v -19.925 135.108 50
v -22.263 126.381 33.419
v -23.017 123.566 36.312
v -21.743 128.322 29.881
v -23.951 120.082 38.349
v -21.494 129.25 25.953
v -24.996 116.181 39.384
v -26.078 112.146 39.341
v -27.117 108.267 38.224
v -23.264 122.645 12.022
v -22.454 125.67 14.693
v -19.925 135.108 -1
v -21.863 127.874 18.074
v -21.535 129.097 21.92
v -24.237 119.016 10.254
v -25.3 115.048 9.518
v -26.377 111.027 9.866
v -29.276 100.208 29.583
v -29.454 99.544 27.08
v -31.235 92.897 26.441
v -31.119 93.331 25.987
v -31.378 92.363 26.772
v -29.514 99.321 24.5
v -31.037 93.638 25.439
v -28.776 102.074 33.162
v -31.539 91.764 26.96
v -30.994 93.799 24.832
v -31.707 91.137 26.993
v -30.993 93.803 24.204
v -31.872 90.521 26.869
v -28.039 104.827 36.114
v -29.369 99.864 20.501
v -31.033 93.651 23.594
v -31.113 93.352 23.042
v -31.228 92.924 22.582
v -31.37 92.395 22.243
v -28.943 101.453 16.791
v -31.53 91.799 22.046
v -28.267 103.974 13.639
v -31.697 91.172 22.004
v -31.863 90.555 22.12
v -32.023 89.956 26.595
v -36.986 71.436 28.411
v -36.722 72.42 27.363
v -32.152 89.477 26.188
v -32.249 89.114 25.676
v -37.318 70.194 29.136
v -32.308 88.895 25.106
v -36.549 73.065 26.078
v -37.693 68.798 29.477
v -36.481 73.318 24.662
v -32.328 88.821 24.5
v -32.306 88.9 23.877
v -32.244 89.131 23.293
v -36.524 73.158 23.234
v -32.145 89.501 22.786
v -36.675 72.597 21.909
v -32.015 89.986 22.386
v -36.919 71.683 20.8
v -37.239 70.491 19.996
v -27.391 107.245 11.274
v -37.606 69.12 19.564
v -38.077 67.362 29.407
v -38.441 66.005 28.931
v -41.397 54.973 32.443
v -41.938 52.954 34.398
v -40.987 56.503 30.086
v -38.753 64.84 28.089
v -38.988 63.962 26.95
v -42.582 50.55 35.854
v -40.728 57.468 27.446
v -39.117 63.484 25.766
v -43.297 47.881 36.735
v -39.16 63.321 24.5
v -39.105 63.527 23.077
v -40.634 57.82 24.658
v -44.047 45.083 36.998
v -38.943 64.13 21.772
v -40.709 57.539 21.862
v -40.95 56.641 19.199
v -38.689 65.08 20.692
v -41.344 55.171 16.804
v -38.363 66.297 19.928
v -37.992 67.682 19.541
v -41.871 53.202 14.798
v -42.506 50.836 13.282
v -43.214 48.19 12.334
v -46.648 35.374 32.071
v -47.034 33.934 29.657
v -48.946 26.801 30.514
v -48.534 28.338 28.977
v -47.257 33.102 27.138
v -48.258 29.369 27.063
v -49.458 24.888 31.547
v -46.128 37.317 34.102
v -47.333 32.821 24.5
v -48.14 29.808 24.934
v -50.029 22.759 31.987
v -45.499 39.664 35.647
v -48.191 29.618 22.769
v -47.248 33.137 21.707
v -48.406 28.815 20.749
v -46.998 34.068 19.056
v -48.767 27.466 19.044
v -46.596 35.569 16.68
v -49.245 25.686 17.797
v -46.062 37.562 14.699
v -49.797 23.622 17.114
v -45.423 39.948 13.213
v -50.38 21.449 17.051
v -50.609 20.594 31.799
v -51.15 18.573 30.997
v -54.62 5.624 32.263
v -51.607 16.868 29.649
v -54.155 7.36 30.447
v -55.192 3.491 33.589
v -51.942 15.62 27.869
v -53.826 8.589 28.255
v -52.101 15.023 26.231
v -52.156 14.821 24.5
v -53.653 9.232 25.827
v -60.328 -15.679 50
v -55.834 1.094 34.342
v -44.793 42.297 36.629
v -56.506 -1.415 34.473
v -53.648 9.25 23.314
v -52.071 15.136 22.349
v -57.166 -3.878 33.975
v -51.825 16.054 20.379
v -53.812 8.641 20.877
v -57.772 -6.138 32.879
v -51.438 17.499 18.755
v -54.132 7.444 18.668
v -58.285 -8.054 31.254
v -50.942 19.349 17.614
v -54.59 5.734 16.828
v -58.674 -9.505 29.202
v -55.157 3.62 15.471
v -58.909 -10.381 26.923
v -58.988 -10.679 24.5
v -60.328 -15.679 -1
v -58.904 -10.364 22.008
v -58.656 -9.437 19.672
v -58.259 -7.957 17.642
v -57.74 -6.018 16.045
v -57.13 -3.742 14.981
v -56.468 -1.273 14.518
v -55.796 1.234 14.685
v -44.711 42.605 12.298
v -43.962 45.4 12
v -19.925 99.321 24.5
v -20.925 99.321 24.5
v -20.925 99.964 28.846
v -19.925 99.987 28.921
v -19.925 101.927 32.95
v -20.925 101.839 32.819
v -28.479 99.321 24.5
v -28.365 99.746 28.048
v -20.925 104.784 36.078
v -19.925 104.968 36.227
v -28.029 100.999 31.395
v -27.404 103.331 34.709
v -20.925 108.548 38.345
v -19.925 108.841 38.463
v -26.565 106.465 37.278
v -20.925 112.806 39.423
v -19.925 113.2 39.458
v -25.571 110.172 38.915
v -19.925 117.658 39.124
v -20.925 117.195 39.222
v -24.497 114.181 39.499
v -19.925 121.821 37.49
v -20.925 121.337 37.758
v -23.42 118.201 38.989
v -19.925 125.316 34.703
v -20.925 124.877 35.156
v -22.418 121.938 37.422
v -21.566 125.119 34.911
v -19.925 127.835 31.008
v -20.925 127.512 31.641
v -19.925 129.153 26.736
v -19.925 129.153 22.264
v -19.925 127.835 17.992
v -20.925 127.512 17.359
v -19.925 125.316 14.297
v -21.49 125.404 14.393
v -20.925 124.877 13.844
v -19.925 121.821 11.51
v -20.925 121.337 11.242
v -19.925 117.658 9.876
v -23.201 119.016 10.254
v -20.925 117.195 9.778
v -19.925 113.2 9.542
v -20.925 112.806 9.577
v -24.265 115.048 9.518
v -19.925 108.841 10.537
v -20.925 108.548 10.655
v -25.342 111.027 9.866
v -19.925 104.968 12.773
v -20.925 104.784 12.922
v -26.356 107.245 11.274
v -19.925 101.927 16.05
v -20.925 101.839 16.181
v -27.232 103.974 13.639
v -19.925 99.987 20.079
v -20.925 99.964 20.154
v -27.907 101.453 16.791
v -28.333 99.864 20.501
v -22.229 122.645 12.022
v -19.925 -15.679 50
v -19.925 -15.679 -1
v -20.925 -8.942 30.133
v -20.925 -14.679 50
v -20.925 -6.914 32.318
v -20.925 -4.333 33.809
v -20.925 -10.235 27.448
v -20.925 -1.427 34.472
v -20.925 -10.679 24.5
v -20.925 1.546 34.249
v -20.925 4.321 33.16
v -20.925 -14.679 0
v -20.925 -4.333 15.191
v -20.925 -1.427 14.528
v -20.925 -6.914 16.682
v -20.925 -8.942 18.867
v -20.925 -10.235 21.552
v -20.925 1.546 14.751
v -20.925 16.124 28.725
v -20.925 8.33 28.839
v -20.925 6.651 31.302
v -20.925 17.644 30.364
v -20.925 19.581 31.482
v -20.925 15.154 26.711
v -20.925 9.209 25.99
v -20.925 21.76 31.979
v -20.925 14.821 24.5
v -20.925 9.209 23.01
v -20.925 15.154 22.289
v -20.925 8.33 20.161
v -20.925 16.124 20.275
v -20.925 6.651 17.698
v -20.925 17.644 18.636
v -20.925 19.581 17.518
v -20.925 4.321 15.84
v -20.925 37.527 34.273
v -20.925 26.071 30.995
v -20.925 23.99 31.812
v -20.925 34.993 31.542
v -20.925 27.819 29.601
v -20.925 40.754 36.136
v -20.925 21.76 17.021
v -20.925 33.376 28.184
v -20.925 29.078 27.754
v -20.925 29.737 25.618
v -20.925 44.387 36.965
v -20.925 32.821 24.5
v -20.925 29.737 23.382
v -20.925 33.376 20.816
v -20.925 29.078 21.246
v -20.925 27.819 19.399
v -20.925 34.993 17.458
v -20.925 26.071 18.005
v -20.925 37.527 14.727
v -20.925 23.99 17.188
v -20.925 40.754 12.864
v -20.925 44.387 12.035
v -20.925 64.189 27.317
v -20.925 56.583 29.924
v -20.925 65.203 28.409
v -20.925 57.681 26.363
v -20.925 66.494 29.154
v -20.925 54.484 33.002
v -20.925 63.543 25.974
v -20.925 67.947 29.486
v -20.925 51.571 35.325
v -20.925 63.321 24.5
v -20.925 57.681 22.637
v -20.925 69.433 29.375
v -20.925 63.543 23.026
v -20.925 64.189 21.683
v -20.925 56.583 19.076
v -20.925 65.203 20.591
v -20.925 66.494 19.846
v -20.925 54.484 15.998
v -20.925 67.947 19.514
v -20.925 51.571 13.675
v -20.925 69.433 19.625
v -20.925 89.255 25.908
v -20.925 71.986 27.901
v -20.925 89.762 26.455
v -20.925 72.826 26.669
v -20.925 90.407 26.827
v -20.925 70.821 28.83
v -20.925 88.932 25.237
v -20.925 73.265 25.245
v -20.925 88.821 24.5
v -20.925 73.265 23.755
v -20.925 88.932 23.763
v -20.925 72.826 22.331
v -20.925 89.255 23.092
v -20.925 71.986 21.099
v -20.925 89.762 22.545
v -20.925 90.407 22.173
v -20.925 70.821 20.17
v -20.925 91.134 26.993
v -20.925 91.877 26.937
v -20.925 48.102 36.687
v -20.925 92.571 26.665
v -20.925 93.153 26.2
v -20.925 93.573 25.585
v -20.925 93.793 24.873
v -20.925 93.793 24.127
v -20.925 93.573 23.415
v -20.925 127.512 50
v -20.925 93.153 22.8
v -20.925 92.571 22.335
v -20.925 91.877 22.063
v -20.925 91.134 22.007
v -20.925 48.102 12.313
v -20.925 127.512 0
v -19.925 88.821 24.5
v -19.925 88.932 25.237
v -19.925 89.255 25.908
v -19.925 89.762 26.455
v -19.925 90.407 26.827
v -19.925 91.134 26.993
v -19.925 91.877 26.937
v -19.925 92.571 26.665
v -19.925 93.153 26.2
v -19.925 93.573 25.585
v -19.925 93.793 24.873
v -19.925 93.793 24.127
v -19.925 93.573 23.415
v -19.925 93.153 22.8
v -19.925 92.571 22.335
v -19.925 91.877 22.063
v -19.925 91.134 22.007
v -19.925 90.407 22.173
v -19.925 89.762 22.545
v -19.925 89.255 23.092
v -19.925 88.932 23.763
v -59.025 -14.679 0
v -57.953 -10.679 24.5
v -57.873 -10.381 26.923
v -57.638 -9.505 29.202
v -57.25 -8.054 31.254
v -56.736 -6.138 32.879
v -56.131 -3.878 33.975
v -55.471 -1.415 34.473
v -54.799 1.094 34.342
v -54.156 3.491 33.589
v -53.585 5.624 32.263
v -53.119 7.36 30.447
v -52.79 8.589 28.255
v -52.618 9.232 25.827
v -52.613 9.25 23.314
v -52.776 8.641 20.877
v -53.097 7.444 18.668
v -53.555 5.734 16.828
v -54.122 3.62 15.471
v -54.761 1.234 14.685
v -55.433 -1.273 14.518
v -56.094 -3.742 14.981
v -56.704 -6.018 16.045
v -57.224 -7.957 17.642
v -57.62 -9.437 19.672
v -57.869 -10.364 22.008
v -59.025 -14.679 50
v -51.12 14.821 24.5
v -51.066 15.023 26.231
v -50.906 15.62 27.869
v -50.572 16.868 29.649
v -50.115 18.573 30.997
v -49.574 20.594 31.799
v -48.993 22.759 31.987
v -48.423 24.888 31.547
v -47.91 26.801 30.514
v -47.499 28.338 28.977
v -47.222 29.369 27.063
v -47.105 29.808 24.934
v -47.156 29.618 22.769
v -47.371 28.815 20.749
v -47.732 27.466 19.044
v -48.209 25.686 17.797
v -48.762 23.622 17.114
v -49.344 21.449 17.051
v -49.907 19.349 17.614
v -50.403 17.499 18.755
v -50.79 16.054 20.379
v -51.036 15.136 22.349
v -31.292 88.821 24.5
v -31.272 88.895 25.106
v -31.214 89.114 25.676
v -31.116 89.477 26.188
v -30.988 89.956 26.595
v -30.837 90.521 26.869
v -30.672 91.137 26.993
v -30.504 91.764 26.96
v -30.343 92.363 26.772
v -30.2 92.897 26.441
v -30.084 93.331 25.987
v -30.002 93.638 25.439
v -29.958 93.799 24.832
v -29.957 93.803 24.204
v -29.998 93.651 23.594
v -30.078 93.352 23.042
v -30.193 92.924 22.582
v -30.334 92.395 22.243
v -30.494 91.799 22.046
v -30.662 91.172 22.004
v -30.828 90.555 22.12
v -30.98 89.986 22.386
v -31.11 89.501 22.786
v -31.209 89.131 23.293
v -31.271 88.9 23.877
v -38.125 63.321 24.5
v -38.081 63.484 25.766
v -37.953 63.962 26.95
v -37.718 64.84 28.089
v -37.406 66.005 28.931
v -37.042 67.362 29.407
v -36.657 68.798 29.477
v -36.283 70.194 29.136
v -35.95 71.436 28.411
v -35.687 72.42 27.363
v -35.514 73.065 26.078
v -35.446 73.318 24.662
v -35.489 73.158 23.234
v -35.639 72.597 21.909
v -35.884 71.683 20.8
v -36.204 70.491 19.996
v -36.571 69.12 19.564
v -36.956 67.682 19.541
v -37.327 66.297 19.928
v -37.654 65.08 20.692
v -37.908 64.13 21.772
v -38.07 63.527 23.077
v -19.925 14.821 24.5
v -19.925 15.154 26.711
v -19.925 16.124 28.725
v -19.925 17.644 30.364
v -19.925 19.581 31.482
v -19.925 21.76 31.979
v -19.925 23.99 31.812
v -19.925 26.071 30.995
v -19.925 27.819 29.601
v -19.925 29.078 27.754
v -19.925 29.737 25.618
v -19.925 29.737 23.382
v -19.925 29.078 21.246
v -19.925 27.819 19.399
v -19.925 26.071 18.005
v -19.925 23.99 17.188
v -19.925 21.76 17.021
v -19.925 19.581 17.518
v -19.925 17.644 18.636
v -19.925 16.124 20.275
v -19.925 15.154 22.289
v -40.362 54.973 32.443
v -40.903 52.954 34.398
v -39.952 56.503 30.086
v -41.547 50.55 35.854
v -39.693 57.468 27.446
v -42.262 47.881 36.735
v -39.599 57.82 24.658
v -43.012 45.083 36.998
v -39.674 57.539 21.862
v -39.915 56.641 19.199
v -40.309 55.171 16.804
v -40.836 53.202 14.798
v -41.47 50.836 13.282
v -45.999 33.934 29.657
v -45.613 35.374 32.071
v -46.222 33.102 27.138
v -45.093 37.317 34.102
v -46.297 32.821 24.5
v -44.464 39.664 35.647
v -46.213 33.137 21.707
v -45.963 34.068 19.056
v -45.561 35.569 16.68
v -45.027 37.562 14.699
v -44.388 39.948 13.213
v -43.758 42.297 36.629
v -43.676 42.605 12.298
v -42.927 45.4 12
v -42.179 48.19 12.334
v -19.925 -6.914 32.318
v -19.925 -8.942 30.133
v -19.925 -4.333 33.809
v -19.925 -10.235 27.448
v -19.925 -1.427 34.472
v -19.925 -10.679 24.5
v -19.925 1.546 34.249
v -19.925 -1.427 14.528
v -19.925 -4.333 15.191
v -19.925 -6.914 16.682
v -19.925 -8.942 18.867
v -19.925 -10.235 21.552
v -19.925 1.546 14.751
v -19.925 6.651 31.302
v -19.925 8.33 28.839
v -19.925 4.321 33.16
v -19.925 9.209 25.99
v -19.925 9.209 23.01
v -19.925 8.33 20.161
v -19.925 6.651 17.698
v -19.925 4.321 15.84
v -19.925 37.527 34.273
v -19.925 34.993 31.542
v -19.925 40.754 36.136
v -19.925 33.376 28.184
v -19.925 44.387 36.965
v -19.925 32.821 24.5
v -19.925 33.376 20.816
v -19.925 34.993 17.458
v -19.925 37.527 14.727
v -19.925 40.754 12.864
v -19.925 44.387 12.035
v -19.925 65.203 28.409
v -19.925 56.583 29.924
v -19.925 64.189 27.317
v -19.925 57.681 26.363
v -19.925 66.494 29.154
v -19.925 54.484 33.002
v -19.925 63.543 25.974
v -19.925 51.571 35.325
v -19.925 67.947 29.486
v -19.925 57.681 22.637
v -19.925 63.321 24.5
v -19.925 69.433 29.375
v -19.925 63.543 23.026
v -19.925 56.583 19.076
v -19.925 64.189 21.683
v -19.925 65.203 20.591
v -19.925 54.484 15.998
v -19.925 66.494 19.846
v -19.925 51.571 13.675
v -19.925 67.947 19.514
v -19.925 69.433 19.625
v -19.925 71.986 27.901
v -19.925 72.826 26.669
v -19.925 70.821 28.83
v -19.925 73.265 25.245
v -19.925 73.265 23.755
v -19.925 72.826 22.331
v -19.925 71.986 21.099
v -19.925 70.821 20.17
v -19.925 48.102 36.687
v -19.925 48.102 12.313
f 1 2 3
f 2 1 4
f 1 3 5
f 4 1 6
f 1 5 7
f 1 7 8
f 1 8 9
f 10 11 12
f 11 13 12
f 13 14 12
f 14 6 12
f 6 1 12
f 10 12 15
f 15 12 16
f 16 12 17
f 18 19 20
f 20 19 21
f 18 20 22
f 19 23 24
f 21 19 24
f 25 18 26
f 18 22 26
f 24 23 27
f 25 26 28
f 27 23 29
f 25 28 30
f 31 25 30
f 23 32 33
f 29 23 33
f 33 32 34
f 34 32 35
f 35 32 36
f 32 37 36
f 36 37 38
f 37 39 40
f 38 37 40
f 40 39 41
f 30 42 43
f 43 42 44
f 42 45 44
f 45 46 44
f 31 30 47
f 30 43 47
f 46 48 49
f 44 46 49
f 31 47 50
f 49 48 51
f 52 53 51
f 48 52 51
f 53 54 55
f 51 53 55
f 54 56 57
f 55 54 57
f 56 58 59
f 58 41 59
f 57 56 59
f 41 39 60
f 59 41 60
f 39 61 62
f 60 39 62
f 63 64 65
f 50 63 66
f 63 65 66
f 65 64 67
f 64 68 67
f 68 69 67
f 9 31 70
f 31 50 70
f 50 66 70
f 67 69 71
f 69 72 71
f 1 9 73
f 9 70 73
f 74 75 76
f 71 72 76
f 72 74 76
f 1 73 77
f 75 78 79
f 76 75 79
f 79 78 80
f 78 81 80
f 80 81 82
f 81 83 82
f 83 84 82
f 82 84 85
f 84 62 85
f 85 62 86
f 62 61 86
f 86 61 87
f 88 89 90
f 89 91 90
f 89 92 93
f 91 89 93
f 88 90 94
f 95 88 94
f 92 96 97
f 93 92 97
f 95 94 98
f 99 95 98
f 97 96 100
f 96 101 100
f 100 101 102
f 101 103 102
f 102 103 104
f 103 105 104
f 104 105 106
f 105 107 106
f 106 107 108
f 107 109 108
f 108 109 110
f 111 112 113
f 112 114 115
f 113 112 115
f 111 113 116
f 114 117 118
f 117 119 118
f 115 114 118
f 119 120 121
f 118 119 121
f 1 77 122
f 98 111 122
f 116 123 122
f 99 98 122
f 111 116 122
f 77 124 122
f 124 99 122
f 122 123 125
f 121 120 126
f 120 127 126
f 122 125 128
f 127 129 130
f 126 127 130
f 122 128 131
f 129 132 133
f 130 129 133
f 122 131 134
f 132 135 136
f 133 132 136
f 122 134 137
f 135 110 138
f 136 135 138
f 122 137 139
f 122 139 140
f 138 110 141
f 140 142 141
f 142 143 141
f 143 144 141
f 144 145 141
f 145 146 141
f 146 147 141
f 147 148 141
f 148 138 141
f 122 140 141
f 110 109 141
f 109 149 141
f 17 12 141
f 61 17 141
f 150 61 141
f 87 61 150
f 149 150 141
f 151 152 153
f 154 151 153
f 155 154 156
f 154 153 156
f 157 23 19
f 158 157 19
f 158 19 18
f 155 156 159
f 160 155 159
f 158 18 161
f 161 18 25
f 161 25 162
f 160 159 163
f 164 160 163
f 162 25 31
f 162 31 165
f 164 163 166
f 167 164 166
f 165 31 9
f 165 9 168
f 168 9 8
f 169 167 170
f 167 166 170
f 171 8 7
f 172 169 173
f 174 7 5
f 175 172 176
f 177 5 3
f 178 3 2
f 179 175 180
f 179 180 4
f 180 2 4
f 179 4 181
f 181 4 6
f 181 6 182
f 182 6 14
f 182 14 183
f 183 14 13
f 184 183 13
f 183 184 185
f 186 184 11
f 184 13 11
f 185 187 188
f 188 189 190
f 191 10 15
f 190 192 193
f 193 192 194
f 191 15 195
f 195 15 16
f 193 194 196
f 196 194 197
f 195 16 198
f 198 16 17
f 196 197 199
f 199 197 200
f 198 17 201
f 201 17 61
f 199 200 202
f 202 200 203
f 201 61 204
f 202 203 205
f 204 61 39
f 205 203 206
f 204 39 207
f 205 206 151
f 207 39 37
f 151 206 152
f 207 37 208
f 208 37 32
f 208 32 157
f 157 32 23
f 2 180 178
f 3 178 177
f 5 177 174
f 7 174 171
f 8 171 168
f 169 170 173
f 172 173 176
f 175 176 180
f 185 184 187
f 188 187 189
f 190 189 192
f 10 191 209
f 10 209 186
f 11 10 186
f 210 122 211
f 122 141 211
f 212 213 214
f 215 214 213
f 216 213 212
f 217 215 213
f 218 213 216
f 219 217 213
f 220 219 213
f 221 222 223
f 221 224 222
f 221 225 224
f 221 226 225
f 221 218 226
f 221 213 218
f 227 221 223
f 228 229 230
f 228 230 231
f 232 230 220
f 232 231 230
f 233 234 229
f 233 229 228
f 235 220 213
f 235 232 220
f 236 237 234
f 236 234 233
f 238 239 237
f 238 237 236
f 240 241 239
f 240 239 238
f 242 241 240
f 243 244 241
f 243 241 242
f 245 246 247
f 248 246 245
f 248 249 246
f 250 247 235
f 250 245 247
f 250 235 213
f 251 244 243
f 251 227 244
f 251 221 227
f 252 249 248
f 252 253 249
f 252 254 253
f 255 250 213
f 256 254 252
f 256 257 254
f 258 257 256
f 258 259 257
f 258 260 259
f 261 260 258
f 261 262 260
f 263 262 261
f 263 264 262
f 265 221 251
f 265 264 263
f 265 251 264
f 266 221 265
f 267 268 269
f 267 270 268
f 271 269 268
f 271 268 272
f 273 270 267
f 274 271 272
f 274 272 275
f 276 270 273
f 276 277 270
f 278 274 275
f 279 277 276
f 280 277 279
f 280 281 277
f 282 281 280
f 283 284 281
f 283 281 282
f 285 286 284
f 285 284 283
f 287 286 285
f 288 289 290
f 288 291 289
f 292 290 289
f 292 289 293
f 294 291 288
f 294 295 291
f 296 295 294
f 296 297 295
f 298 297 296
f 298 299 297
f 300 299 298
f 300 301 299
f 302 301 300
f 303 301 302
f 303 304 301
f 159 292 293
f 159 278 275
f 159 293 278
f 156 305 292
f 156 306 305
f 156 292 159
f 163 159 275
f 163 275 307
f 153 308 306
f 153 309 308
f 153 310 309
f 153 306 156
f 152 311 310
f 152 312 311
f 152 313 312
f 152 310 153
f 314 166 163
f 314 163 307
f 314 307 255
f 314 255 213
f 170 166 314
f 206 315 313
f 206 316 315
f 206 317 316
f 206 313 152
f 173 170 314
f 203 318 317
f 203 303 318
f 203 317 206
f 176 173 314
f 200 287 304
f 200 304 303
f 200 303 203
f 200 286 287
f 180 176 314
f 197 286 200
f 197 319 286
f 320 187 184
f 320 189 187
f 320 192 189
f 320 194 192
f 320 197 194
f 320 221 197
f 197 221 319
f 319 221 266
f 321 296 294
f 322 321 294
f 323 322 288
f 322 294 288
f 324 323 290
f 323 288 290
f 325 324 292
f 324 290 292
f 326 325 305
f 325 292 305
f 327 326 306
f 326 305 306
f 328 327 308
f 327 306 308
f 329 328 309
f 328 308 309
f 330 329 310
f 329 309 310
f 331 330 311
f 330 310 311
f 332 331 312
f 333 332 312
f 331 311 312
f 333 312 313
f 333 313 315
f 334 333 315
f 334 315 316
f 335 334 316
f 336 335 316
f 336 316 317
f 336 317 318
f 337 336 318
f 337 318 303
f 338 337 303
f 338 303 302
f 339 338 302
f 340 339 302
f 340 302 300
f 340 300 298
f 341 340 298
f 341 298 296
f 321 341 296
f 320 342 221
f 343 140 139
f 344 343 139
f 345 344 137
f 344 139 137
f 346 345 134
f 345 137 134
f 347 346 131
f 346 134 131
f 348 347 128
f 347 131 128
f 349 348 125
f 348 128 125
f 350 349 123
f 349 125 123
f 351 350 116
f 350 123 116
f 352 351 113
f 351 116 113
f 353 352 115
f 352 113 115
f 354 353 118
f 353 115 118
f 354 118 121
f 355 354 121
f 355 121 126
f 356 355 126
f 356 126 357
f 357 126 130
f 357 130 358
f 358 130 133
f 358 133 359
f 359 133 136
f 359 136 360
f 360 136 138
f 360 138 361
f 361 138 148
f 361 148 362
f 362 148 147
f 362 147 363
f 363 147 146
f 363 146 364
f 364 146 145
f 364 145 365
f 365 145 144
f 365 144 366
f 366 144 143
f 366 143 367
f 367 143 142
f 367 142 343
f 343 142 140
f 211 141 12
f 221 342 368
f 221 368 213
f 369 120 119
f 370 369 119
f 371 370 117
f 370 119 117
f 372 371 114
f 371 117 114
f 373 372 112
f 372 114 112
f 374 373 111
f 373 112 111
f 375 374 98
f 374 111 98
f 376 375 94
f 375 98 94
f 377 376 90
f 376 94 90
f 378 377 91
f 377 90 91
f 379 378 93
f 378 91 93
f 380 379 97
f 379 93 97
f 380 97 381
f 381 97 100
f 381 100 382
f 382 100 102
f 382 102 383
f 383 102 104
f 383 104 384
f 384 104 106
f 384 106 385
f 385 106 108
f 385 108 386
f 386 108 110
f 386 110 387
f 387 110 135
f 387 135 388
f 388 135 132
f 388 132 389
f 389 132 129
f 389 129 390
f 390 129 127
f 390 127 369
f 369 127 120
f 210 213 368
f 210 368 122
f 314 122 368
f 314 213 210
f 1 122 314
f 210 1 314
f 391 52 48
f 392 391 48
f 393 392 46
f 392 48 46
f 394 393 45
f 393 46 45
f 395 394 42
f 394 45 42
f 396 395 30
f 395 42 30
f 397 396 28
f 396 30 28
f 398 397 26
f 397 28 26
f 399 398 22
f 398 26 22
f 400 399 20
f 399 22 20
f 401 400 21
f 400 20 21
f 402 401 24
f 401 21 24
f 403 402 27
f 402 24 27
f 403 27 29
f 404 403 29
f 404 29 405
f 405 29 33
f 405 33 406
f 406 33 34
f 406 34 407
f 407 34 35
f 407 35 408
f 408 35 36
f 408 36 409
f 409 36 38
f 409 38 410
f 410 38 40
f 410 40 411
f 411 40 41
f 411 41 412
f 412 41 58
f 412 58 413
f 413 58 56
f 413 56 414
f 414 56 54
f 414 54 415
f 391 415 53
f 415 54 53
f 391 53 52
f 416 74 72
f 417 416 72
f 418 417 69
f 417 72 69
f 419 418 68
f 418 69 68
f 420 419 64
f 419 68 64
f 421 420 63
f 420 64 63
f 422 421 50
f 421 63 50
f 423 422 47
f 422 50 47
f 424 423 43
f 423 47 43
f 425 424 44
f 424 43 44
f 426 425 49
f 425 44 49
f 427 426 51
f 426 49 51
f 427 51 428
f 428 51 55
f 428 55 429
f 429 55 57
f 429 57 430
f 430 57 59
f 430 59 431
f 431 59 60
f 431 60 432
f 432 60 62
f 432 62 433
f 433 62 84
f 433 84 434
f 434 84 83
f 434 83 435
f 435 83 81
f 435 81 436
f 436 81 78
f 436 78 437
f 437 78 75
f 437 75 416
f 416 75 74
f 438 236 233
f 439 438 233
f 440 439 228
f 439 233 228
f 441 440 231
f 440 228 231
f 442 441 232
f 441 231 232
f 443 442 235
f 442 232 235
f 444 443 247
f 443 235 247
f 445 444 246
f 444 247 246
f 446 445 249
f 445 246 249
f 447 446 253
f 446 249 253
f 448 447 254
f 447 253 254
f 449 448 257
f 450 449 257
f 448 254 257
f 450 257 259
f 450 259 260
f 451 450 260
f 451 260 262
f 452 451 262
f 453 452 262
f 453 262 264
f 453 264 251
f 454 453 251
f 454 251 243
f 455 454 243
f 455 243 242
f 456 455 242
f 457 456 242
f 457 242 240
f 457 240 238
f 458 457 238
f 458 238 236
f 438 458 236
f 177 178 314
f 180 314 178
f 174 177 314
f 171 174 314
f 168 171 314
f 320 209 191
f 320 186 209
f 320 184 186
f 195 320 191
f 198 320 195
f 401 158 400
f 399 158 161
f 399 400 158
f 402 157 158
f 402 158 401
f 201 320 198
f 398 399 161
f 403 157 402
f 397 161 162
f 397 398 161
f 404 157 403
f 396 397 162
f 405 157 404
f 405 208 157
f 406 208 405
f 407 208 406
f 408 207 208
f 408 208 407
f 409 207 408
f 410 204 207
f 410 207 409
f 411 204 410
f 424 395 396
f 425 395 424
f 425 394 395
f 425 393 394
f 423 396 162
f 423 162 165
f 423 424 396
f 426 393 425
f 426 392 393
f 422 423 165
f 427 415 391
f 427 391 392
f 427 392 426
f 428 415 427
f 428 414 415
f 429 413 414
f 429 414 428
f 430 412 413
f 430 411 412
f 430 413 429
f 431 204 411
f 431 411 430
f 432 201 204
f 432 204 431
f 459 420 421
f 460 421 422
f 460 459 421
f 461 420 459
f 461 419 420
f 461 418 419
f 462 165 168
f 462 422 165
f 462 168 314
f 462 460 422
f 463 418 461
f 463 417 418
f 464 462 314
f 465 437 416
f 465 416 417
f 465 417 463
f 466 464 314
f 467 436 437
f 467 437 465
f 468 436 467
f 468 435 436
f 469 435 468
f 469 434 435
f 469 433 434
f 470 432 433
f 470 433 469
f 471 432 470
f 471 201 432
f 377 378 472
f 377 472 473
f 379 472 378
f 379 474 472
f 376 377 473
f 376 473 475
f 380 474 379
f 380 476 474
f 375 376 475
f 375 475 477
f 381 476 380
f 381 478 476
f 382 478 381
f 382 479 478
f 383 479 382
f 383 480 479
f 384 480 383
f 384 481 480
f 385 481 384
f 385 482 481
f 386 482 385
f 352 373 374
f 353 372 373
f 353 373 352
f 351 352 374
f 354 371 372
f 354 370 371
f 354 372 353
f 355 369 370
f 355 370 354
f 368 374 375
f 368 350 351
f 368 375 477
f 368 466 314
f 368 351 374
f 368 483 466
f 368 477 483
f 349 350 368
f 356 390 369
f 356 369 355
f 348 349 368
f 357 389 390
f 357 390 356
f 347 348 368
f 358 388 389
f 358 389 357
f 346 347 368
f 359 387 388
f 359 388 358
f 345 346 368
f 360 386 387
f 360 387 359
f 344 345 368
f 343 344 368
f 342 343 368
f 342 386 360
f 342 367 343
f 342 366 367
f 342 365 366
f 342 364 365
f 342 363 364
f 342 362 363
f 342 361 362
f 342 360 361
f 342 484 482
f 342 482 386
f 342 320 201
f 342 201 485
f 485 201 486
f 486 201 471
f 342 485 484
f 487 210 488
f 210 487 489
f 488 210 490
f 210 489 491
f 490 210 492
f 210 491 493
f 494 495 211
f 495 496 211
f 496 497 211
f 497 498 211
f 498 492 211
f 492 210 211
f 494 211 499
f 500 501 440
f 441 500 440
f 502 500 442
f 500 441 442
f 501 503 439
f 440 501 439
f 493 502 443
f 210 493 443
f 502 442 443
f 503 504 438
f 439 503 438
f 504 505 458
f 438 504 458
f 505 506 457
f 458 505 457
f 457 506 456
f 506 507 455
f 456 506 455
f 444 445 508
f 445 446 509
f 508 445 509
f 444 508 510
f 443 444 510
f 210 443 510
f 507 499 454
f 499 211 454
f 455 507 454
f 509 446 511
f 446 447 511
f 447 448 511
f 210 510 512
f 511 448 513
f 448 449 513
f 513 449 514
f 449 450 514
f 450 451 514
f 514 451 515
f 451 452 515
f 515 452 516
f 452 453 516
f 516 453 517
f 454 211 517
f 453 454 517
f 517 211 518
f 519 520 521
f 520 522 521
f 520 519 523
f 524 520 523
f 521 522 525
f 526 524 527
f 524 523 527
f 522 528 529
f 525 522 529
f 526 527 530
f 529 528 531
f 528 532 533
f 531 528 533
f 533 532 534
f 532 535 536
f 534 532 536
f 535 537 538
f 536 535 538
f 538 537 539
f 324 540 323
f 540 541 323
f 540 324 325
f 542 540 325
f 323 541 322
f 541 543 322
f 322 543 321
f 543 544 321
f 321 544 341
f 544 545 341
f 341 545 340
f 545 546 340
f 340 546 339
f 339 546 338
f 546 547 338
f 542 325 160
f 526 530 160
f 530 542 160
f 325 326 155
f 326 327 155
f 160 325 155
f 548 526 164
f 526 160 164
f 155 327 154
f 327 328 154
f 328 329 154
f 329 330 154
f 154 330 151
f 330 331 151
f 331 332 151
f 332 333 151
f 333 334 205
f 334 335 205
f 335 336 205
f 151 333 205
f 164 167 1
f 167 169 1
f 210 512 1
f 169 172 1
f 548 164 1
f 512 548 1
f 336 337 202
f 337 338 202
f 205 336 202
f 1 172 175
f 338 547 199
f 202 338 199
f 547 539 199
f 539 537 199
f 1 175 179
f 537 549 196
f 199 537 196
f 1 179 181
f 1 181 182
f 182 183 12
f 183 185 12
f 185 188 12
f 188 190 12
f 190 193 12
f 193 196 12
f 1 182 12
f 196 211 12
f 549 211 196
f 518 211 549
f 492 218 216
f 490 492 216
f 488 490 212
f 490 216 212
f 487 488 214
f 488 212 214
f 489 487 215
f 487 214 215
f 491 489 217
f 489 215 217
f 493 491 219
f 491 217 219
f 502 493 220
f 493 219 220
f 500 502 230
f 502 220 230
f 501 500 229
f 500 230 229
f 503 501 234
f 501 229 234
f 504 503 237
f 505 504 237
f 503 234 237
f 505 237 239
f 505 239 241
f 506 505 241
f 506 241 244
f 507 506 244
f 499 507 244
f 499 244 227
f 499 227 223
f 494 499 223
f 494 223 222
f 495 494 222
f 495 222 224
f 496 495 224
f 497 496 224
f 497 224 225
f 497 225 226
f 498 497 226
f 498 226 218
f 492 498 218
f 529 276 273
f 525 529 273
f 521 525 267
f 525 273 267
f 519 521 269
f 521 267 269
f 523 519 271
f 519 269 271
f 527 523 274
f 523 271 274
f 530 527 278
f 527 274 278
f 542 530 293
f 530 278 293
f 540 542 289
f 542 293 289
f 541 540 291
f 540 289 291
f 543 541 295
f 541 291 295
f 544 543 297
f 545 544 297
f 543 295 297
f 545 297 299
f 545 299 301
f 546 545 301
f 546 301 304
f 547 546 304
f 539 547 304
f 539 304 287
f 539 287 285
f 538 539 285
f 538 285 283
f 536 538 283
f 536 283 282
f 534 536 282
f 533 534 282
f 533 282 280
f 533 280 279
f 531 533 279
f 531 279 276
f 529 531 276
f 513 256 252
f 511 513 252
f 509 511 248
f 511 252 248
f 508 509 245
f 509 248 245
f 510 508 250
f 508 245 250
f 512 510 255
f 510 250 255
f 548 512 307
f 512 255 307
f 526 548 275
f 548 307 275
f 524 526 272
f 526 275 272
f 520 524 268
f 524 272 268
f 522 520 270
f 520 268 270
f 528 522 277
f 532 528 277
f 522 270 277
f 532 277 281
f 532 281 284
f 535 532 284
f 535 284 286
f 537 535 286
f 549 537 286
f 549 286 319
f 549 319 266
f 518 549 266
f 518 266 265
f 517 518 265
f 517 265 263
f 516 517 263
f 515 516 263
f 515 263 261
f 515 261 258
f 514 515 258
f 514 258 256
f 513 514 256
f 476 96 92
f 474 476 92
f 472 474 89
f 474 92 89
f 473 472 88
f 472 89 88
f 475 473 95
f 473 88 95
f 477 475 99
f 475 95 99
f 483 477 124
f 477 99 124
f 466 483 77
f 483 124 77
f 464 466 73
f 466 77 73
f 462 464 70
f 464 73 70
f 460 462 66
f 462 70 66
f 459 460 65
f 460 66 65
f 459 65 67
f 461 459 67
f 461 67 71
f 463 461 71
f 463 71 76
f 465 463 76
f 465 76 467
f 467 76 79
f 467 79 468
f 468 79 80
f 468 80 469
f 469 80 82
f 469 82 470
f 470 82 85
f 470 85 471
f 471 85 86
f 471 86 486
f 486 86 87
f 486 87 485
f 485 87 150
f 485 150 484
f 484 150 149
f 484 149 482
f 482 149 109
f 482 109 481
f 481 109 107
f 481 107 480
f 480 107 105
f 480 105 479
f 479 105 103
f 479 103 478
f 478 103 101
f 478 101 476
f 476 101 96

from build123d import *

# Parameters (mm, degrees)
F1_DEPTH = 50
F2_T     = 1
F4_D     = 30
F5_D     = 20
F6_D     = 25
F7_D     = 10
F8_D     = 5
F9_D     = 15


with BuildPart() as f1:
    # F0 (on Top) → F1 (new body)
    with BuildSketch(Plane.XY):
        Polygon((-20.9249958888, -14.6793369754), (-20.9249958888, 127.5117987929), (-59.0249958888, -14.6793369754), align=None)
    extrude(amount=F1_DEPTH)

    # F2
    f2_openings = [f1.faces().sort_by_distance(p)[0] for p in [
        (-33.624996, 32.717708, 50),
    ]]
    offset(amount=F2_T, openings=f2_openings, kind=Kind.INTERSECTION)

    # F4 (through all)
    with Locations(Plane.YZ.offset(-19.9249958888)):
        with Locations((114.3206630246, 24.5)):
            Hole(F4_D / 2)

    # F5 (through all)
    with Locations(Plane.YZ.offset(-19.9249958888)):
        with Locations((-0.6793369754, 24.5)):
            Hole(F5_D / 2)

    # F6 (through all)
    with Locations(Plane.YZ.offset(-19.9249958888)):
        with Locations((45.3206630246, 24.5)):
            Hole(F6_D / 2)

    # F7 (through all)
    with Locations(Plane.YZ.offset(-19.9249958888)):
        with Locations((68.3206630246, 24.5)):
            Hole(F7_D / 2)

    # F8 (through all)
    with Locations(Plane.YZ.offset(-19.9249958888)):
        with Locations((91.3206630246, 24.5)):
            Hole(F8_D / 2)

    # F9 (through all)
    with Locations(Plane.YZ.offset(-19.9249958888)):
        with Locations((22.3206630246, 24.5)):
            Hole(F9_D / 2)


solid = f1.part
